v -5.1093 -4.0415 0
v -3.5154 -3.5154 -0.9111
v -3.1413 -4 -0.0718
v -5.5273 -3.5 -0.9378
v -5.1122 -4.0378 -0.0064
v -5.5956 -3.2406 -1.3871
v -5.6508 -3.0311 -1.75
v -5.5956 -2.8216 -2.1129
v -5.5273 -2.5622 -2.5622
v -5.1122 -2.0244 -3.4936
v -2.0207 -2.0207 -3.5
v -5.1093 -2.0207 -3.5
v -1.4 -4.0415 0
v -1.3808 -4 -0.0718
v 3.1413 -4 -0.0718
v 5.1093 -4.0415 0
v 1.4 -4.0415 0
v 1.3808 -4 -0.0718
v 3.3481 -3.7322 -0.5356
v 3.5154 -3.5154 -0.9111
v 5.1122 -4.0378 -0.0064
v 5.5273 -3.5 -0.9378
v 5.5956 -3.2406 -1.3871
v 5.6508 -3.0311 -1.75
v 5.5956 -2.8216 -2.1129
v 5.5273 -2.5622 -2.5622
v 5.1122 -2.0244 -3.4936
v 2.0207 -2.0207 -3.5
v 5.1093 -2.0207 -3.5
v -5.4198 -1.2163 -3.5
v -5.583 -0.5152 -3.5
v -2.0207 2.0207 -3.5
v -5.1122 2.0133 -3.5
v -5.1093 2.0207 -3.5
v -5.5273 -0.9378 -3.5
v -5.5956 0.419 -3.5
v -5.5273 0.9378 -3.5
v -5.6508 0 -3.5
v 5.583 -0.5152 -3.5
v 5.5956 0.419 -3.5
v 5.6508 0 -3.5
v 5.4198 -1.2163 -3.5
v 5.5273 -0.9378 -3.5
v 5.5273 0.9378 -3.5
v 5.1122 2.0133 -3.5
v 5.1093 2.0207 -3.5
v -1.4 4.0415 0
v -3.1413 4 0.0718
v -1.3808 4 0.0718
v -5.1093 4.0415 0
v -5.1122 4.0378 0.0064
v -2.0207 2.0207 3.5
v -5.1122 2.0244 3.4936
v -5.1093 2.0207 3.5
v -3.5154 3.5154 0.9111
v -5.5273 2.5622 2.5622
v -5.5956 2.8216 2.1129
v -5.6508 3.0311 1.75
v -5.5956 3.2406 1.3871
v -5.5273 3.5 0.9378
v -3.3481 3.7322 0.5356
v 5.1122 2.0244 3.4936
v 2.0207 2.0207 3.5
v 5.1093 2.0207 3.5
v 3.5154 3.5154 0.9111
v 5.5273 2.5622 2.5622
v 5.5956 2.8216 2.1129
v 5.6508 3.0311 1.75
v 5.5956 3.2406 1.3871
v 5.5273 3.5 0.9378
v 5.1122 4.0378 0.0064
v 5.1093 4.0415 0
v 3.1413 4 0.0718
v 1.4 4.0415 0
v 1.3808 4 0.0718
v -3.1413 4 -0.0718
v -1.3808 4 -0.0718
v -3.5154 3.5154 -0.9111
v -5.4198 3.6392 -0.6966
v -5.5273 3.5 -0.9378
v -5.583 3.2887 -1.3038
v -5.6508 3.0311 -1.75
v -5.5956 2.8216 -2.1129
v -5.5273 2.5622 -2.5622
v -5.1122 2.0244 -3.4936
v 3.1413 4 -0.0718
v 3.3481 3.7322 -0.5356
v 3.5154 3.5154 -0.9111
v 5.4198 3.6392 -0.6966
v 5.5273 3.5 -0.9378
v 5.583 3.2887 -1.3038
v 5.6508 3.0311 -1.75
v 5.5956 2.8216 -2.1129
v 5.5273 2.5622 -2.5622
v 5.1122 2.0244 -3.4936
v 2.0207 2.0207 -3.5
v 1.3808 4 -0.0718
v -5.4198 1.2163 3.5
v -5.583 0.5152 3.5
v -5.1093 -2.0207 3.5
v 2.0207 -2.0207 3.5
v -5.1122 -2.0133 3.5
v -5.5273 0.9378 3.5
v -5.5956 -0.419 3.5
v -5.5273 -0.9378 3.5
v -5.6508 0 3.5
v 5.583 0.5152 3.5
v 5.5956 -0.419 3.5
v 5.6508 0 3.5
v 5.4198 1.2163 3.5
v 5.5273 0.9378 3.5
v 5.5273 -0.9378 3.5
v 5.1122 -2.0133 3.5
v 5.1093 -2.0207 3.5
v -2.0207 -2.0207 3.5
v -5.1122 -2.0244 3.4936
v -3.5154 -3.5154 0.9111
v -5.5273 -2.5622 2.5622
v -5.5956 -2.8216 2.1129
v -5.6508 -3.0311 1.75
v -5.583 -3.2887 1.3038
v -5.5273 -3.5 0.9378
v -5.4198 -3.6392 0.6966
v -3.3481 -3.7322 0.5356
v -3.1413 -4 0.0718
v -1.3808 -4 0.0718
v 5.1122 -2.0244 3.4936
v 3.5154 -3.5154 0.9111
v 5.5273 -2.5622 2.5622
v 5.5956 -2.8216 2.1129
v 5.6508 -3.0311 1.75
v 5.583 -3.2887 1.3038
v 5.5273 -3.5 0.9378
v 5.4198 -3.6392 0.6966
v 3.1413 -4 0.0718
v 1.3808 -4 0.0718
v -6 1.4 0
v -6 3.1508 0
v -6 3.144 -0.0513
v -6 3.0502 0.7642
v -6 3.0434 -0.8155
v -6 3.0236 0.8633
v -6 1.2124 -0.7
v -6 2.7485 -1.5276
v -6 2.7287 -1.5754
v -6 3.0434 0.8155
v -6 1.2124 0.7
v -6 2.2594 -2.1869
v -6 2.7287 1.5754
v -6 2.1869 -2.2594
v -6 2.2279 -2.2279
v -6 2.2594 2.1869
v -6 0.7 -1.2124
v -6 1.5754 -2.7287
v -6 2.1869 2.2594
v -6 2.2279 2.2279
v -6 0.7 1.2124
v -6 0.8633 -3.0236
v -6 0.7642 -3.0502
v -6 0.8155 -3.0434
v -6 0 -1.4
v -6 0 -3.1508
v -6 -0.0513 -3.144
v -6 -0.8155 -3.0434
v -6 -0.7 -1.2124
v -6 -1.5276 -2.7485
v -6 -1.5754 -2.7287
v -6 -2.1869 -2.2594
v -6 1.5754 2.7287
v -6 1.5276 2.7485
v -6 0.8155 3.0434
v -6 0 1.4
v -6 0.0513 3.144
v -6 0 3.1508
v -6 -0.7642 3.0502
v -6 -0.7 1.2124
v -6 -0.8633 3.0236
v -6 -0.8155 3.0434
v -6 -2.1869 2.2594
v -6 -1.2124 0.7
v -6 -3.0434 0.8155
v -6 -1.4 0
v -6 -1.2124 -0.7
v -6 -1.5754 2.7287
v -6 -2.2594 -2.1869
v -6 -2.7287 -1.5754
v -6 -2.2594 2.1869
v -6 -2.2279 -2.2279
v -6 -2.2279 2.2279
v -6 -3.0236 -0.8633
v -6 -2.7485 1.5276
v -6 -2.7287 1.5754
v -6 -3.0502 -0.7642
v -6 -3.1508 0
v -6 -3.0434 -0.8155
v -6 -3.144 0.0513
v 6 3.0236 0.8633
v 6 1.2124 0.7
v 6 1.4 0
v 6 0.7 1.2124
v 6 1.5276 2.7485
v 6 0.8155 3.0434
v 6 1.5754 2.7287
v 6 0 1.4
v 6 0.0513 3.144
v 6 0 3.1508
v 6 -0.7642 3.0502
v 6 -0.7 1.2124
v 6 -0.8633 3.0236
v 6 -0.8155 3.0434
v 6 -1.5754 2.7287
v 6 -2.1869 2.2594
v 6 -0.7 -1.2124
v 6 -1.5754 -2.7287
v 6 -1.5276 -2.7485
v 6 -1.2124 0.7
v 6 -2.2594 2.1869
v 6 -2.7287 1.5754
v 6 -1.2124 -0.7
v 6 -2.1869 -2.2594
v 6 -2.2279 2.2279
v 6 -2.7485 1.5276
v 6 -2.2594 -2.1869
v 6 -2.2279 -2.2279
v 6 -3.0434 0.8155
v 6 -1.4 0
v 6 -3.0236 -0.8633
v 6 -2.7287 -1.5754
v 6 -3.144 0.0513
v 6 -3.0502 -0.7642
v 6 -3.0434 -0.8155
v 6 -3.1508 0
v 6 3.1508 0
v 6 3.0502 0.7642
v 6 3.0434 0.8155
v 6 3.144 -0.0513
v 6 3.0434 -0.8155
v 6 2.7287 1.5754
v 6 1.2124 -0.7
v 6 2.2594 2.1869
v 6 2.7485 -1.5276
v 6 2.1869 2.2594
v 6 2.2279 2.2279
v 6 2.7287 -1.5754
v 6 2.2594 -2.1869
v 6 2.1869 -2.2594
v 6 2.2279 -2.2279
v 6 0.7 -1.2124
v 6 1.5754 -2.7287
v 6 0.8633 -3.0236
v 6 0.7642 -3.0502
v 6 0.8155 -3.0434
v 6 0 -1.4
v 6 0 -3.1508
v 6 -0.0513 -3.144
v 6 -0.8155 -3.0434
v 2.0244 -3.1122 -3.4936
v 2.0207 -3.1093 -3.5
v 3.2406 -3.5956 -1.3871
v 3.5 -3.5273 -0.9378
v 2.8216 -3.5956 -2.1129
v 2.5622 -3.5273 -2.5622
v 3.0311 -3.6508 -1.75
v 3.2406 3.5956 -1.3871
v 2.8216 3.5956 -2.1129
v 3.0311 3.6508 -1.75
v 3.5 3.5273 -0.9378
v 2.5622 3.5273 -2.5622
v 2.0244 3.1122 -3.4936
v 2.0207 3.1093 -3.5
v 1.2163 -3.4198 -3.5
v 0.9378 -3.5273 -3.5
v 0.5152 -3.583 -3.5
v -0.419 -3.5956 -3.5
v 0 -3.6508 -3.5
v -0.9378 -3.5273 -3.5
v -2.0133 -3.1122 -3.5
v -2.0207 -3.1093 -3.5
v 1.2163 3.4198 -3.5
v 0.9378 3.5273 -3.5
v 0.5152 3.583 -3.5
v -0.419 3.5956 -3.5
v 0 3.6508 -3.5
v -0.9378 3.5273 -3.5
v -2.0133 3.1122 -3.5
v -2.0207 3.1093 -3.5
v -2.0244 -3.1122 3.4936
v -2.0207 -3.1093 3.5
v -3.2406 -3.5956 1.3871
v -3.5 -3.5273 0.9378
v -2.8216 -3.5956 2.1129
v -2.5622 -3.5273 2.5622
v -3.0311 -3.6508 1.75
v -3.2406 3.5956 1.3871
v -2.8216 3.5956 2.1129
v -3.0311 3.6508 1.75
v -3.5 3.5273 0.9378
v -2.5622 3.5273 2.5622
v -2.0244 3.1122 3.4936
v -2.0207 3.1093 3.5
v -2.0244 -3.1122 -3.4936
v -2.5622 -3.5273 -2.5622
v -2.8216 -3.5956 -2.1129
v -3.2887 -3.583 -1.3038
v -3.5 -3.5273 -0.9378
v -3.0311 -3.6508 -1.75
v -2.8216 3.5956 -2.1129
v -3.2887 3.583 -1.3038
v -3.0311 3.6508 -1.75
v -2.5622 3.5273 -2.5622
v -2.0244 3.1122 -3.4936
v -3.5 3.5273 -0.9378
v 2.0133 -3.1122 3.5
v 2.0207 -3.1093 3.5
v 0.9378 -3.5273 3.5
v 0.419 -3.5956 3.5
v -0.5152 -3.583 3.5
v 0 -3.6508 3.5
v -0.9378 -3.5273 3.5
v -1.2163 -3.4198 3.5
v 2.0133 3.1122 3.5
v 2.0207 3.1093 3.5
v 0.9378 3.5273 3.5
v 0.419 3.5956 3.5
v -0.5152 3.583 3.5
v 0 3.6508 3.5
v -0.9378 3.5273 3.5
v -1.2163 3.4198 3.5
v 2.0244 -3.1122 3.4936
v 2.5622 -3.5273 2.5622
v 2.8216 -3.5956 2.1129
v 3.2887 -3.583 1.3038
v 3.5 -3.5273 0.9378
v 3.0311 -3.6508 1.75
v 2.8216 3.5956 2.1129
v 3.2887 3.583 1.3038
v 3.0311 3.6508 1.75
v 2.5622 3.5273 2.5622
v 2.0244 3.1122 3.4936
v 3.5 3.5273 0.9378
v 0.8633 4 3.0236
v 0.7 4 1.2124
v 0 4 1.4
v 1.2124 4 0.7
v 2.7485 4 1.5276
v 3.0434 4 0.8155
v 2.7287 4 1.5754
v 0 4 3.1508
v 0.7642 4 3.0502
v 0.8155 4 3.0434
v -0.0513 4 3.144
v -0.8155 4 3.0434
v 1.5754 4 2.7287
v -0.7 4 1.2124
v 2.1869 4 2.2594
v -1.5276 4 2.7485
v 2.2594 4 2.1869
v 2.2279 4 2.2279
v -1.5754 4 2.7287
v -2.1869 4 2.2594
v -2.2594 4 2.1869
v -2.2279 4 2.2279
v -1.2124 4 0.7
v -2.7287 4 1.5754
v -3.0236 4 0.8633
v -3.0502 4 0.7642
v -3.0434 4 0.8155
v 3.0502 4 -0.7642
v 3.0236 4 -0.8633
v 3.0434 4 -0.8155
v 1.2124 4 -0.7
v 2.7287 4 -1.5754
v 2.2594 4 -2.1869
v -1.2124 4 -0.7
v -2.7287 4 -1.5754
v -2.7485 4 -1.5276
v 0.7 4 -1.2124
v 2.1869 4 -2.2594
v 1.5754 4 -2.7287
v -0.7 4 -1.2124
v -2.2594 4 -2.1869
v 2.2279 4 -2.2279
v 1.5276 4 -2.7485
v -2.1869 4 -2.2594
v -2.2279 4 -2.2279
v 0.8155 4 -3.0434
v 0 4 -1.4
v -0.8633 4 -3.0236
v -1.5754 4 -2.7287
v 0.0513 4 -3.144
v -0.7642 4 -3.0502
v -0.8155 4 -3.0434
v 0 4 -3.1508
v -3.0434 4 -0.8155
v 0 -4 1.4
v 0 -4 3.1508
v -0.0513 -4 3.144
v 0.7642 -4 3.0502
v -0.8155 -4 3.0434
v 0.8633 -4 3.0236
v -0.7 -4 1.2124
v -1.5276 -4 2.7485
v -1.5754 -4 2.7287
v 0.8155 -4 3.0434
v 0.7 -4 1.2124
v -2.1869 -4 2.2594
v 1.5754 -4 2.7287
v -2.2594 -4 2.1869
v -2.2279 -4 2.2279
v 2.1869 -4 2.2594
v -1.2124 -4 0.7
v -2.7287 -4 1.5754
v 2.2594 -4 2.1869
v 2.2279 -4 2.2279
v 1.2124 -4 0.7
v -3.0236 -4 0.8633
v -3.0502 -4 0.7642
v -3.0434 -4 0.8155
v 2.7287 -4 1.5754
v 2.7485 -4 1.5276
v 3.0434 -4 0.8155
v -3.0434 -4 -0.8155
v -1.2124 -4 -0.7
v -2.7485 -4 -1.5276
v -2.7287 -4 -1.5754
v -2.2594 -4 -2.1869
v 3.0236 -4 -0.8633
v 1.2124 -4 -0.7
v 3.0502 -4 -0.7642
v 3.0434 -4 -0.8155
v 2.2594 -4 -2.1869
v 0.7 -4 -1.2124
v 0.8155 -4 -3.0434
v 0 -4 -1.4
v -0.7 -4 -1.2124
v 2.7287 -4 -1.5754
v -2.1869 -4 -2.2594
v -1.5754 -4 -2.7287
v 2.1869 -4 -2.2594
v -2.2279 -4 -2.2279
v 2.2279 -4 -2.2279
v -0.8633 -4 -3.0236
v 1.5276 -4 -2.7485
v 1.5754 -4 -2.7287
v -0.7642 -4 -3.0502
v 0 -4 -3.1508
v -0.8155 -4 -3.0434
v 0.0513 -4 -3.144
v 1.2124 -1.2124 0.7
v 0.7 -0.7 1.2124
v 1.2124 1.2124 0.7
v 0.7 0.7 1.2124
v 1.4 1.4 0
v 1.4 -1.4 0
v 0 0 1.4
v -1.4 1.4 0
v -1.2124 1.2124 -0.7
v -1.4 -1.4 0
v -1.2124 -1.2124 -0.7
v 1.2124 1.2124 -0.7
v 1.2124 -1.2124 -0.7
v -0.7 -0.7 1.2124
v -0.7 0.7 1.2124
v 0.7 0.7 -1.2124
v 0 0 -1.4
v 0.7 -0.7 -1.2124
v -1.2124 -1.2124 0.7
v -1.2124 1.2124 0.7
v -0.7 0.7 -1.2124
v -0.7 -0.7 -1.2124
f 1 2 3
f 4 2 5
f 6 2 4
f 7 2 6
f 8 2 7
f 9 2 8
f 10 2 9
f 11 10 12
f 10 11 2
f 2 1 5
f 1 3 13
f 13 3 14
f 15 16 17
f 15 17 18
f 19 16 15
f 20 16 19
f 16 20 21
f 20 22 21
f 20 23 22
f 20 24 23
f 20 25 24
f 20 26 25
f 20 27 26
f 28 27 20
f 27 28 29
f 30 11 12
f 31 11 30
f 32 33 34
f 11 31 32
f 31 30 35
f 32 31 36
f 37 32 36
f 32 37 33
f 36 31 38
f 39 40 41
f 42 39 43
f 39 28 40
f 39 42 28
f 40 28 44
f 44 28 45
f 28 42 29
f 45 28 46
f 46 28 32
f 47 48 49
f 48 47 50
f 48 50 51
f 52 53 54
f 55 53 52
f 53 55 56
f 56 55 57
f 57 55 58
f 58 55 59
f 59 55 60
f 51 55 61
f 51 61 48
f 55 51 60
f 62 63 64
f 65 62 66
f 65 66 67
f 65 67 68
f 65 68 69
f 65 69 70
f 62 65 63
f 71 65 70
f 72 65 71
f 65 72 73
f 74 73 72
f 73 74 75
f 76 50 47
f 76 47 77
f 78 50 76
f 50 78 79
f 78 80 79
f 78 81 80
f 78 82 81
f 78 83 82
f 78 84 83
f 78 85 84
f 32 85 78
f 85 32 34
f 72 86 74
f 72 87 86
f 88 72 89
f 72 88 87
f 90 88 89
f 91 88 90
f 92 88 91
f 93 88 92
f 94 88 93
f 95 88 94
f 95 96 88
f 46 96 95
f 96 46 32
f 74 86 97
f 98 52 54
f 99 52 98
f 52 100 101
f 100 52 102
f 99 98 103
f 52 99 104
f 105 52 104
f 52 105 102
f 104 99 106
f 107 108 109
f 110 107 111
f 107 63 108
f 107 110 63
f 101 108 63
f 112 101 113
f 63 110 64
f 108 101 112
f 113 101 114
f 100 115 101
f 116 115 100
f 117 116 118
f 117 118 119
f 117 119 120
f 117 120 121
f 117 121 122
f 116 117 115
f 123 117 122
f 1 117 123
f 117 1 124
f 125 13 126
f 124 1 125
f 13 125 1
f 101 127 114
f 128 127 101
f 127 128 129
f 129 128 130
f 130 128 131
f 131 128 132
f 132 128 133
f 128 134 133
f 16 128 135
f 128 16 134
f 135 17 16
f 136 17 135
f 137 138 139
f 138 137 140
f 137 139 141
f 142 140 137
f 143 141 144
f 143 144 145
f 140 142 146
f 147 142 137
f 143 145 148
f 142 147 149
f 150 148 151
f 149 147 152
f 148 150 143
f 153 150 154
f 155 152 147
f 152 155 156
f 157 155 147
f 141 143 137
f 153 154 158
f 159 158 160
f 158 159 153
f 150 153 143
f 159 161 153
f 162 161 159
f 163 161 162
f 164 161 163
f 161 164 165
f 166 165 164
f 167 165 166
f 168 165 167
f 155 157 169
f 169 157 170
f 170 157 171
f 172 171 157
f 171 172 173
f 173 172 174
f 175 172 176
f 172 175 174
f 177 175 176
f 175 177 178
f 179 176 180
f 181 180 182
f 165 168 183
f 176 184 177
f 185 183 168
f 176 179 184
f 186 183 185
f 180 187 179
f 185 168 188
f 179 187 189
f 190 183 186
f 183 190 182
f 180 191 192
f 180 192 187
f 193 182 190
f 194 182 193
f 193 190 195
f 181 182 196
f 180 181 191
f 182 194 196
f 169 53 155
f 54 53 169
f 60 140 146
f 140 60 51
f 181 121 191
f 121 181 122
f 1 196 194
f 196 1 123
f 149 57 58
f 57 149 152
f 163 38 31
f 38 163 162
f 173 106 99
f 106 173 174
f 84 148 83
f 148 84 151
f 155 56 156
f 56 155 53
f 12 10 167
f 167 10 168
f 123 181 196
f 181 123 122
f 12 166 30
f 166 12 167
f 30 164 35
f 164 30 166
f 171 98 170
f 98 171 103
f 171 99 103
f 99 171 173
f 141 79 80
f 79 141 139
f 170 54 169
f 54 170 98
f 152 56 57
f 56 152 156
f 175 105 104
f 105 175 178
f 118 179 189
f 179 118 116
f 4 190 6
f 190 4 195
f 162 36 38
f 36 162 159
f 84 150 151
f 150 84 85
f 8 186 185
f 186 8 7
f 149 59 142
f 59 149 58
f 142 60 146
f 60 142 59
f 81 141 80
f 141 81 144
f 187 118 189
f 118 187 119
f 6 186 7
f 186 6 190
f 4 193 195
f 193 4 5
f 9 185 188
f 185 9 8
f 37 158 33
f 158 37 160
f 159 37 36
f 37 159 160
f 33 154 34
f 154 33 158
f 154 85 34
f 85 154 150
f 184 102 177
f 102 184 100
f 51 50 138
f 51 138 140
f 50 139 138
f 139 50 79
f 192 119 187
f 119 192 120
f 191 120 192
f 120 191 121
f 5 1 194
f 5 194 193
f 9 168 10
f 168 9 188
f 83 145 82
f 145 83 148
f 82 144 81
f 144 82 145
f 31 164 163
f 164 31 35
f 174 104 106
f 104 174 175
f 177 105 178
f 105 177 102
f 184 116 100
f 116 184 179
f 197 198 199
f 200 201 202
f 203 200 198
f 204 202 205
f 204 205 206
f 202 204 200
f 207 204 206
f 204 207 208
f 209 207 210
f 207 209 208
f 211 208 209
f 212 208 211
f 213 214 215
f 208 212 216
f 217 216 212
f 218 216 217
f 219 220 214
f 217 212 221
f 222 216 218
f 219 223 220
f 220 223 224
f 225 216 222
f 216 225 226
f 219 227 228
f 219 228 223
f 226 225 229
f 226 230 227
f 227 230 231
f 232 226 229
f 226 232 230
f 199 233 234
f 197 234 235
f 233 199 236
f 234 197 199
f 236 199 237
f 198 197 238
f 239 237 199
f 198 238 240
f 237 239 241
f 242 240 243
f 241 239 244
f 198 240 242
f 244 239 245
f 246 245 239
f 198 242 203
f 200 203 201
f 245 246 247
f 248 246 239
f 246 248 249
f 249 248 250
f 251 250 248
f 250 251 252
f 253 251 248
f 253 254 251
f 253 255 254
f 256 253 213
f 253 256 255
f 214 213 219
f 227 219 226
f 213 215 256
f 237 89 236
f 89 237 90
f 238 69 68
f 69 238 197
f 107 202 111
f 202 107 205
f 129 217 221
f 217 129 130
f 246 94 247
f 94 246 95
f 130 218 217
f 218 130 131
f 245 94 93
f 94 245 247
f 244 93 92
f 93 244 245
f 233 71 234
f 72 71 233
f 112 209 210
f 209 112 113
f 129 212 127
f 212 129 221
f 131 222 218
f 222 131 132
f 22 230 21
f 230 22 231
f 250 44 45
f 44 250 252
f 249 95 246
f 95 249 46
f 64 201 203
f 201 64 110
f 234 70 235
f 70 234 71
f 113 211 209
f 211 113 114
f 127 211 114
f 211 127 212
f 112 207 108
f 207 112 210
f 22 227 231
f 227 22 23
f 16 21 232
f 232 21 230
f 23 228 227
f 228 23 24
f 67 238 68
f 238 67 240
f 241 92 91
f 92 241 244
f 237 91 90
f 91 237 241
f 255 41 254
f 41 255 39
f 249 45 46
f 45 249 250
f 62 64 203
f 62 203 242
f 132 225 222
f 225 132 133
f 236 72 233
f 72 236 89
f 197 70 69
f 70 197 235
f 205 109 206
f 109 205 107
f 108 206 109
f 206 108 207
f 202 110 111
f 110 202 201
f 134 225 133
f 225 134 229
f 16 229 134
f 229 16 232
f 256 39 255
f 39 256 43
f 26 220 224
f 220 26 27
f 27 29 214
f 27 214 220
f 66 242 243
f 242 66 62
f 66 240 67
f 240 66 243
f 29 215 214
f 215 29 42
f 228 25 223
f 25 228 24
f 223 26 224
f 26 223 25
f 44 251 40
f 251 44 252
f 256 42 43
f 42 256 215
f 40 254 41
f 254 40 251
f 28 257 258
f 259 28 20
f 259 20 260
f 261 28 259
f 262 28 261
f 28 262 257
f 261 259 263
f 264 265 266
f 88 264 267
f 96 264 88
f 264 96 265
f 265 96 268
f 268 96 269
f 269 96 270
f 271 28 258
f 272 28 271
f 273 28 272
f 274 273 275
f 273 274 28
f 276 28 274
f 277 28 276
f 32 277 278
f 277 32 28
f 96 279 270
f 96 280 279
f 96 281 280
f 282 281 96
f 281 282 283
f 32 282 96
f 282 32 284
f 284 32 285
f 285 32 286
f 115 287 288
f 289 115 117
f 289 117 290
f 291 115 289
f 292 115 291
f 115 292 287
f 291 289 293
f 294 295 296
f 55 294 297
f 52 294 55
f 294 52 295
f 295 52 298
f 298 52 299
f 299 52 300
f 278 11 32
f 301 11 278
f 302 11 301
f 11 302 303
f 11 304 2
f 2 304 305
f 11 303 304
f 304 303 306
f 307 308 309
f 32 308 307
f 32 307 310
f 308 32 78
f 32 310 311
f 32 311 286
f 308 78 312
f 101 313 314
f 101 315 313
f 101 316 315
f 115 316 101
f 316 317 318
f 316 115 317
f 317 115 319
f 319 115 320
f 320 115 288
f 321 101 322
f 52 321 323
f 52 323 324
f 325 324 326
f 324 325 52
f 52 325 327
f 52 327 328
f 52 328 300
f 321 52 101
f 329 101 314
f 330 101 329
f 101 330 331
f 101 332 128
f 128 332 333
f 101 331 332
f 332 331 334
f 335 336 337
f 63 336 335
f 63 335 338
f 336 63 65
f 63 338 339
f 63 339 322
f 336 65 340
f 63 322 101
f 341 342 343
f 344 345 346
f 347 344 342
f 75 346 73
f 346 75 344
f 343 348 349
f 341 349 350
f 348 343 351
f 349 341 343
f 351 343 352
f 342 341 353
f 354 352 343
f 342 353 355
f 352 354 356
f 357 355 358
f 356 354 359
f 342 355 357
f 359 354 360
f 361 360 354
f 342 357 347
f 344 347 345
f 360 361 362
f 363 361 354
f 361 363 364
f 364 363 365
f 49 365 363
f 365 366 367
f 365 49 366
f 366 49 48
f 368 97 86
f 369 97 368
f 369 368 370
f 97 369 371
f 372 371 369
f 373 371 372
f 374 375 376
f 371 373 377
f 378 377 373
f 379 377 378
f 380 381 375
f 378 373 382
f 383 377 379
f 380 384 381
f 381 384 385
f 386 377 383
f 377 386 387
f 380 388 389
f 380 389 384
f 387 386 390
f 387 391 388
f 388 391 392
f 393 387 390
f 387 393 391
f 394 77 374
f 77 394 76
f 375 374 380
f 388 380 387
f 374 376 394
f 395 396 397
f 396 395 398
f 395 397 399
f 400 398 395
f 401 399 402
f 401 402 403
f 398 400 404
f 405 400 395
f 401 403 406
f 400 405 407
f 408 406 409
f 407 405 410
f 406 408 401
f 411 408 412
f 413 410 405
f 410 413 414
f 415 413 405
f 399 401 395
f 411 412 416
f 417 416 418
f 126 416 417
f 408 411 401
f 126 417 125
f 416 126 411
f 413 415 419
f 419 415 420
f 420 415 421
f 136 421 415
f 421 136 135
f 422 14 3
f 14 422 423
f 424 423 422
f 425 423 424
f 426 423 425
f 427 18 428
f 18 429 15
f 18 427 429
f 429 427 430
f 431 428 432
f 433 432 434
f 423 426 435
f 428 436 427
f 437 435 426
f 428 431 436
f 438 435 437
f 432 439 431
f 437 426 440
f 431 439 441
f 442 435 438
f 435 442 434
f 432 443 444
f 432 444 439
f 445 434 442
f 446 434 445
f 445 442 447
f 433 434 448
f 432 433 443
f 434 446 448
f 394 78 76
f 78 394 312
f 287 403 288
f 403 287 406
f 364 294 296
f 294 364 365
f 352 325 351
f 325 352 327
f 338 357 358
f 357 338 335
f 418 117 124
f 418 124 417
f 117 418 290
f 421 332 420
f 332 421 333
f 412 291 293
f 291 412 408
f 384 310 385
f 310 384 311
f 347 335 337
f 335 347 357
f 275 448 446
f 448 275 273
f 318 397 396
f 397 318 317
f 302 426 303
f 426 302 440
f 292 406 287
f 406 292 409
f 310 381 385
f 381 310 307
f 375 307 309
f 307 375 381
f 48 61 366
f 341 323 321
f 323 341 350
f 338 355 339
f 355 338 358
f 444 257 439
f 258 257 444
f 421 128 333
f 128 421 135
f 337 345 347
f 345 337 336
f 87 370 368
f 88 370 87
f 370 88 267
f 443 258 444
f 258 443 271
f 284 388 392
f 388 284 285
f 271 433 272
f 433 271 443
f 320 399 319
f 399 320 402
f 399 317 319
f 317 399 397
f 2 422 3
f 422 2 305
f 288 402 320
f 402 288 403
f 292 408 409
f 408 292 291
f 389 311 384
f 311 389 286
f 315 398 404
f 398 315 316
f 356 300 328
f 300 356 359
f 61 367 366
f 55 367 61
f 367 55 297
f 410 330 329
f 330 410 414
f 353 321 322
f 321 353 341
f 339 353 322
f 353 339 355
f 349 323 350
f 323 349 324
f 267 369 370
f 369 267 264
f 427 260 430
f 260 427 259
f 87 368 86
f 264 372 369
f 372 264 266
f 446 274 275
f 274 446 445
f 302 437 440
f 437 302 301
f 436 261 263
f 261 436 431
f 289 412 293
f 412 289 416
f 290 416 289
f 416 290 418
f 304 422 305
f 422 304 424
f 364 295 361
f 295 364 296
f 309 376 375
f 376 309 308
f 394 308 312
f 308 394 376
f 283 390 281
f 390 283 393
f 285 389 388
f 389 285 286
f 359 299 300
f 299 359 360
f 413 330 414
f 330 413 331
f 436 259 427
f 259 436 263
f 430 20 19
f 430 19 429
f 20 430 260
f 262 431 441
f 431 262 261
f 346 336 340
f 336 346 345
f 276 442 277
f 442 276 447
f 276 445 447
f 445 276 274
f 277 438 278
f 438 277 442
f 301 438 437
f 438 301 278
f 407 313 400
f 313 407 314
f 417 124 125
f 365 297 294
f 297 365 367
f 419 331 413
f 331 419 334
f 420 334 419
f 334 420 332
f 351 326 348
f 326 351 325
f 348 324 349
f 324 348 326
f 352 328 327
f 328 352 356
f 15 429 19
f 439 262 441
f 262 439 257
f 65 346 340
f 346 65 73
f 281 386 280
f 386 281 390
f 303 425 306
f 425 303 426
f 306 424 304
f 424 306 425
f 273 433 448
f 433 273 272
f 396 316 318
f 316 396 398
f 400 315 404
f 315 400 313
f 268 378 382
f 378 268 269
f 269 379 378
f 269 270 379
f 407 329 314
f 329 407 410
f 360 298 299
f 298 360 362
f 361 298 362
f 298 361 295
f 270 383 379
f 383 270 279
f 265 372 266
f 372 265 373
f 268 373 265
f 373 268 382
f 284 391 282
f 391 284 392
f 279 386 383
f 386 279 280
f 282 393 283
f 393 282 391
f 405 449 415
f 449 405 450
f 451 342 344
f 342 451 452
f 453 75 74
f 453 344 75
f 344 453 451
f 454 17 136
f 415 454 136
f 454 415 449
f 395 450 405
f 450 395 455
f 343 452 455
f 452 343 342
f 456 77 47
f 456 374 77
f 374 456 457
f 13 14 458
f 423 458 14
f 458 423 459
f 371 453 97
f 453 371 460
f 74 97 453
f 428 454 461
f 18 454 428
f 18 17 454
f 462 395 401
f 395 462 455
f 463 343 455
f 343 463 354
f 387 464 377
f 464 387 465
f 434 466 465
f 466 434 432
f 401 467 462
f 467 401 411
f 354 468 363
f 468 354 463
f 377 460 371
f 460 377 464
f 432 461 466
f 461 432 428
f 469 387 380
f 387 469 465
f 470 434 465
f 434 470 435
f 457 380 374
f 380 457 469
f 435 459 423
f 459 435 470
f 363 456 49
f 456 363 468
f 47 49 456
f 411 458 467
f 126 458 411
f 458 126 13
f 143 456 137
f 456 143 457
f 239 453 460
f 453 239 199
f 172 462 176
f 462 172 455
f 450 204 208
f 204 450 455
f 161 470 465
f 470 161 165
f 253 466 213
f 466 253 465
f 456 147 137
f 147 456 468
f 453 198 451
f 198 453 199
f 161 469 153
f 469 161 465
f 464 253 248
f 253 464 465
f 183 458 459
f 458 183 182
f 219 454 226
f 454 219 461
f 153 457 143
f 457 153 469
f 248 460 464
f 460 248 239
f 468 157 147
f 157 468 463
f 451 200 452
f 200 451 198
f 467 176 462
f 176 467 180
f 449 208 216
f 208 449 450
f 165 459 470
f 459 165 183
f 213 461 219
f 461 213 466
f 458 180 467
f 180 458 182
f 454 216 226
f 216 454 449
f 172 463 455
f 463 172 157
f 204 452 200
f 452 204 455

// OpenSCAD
h = 7;
r = h/2 / cos(30);

module stumpy() {
  rotate([0, 90, 0]) rotate([0, 0, 30]) intersection() {
    cylinder(r=r, h=8, center=true, $fn=6);
    sphere(r=5.1, $fn=24);
  }
}

module middle() {
  difference() {
    union() {
      translate([-2, 0, 0]) stumpy();
      translate([2, 0, 0]) stumpy();
      rotate([0, 0, 90]) stumpy();
// set screw guide
//      translate([0, 0, 4]) cylinder(r=3, h=2, center=true, $fn=12);
    }
    rotate([90, 0, 0]) cylinder(r=1.4, h=30, center=true, $fn=12);
    rotate([0, 90, 0]) cylinder(r=1.4, h=30, center=true, $fn=12);
// set screw hole
//    translate([0, 0, 3]) cylinder(r=1.4, h=6, center=true, $fn=12);
  }
}


//for (x = [0:2]) for (y = [0:3])
//translate([x*20, y*15, h/2]) middle();

//translate([-20,  0, h/2]) middle();
//translate([-20, 15, h/2]) middle();

middle();
